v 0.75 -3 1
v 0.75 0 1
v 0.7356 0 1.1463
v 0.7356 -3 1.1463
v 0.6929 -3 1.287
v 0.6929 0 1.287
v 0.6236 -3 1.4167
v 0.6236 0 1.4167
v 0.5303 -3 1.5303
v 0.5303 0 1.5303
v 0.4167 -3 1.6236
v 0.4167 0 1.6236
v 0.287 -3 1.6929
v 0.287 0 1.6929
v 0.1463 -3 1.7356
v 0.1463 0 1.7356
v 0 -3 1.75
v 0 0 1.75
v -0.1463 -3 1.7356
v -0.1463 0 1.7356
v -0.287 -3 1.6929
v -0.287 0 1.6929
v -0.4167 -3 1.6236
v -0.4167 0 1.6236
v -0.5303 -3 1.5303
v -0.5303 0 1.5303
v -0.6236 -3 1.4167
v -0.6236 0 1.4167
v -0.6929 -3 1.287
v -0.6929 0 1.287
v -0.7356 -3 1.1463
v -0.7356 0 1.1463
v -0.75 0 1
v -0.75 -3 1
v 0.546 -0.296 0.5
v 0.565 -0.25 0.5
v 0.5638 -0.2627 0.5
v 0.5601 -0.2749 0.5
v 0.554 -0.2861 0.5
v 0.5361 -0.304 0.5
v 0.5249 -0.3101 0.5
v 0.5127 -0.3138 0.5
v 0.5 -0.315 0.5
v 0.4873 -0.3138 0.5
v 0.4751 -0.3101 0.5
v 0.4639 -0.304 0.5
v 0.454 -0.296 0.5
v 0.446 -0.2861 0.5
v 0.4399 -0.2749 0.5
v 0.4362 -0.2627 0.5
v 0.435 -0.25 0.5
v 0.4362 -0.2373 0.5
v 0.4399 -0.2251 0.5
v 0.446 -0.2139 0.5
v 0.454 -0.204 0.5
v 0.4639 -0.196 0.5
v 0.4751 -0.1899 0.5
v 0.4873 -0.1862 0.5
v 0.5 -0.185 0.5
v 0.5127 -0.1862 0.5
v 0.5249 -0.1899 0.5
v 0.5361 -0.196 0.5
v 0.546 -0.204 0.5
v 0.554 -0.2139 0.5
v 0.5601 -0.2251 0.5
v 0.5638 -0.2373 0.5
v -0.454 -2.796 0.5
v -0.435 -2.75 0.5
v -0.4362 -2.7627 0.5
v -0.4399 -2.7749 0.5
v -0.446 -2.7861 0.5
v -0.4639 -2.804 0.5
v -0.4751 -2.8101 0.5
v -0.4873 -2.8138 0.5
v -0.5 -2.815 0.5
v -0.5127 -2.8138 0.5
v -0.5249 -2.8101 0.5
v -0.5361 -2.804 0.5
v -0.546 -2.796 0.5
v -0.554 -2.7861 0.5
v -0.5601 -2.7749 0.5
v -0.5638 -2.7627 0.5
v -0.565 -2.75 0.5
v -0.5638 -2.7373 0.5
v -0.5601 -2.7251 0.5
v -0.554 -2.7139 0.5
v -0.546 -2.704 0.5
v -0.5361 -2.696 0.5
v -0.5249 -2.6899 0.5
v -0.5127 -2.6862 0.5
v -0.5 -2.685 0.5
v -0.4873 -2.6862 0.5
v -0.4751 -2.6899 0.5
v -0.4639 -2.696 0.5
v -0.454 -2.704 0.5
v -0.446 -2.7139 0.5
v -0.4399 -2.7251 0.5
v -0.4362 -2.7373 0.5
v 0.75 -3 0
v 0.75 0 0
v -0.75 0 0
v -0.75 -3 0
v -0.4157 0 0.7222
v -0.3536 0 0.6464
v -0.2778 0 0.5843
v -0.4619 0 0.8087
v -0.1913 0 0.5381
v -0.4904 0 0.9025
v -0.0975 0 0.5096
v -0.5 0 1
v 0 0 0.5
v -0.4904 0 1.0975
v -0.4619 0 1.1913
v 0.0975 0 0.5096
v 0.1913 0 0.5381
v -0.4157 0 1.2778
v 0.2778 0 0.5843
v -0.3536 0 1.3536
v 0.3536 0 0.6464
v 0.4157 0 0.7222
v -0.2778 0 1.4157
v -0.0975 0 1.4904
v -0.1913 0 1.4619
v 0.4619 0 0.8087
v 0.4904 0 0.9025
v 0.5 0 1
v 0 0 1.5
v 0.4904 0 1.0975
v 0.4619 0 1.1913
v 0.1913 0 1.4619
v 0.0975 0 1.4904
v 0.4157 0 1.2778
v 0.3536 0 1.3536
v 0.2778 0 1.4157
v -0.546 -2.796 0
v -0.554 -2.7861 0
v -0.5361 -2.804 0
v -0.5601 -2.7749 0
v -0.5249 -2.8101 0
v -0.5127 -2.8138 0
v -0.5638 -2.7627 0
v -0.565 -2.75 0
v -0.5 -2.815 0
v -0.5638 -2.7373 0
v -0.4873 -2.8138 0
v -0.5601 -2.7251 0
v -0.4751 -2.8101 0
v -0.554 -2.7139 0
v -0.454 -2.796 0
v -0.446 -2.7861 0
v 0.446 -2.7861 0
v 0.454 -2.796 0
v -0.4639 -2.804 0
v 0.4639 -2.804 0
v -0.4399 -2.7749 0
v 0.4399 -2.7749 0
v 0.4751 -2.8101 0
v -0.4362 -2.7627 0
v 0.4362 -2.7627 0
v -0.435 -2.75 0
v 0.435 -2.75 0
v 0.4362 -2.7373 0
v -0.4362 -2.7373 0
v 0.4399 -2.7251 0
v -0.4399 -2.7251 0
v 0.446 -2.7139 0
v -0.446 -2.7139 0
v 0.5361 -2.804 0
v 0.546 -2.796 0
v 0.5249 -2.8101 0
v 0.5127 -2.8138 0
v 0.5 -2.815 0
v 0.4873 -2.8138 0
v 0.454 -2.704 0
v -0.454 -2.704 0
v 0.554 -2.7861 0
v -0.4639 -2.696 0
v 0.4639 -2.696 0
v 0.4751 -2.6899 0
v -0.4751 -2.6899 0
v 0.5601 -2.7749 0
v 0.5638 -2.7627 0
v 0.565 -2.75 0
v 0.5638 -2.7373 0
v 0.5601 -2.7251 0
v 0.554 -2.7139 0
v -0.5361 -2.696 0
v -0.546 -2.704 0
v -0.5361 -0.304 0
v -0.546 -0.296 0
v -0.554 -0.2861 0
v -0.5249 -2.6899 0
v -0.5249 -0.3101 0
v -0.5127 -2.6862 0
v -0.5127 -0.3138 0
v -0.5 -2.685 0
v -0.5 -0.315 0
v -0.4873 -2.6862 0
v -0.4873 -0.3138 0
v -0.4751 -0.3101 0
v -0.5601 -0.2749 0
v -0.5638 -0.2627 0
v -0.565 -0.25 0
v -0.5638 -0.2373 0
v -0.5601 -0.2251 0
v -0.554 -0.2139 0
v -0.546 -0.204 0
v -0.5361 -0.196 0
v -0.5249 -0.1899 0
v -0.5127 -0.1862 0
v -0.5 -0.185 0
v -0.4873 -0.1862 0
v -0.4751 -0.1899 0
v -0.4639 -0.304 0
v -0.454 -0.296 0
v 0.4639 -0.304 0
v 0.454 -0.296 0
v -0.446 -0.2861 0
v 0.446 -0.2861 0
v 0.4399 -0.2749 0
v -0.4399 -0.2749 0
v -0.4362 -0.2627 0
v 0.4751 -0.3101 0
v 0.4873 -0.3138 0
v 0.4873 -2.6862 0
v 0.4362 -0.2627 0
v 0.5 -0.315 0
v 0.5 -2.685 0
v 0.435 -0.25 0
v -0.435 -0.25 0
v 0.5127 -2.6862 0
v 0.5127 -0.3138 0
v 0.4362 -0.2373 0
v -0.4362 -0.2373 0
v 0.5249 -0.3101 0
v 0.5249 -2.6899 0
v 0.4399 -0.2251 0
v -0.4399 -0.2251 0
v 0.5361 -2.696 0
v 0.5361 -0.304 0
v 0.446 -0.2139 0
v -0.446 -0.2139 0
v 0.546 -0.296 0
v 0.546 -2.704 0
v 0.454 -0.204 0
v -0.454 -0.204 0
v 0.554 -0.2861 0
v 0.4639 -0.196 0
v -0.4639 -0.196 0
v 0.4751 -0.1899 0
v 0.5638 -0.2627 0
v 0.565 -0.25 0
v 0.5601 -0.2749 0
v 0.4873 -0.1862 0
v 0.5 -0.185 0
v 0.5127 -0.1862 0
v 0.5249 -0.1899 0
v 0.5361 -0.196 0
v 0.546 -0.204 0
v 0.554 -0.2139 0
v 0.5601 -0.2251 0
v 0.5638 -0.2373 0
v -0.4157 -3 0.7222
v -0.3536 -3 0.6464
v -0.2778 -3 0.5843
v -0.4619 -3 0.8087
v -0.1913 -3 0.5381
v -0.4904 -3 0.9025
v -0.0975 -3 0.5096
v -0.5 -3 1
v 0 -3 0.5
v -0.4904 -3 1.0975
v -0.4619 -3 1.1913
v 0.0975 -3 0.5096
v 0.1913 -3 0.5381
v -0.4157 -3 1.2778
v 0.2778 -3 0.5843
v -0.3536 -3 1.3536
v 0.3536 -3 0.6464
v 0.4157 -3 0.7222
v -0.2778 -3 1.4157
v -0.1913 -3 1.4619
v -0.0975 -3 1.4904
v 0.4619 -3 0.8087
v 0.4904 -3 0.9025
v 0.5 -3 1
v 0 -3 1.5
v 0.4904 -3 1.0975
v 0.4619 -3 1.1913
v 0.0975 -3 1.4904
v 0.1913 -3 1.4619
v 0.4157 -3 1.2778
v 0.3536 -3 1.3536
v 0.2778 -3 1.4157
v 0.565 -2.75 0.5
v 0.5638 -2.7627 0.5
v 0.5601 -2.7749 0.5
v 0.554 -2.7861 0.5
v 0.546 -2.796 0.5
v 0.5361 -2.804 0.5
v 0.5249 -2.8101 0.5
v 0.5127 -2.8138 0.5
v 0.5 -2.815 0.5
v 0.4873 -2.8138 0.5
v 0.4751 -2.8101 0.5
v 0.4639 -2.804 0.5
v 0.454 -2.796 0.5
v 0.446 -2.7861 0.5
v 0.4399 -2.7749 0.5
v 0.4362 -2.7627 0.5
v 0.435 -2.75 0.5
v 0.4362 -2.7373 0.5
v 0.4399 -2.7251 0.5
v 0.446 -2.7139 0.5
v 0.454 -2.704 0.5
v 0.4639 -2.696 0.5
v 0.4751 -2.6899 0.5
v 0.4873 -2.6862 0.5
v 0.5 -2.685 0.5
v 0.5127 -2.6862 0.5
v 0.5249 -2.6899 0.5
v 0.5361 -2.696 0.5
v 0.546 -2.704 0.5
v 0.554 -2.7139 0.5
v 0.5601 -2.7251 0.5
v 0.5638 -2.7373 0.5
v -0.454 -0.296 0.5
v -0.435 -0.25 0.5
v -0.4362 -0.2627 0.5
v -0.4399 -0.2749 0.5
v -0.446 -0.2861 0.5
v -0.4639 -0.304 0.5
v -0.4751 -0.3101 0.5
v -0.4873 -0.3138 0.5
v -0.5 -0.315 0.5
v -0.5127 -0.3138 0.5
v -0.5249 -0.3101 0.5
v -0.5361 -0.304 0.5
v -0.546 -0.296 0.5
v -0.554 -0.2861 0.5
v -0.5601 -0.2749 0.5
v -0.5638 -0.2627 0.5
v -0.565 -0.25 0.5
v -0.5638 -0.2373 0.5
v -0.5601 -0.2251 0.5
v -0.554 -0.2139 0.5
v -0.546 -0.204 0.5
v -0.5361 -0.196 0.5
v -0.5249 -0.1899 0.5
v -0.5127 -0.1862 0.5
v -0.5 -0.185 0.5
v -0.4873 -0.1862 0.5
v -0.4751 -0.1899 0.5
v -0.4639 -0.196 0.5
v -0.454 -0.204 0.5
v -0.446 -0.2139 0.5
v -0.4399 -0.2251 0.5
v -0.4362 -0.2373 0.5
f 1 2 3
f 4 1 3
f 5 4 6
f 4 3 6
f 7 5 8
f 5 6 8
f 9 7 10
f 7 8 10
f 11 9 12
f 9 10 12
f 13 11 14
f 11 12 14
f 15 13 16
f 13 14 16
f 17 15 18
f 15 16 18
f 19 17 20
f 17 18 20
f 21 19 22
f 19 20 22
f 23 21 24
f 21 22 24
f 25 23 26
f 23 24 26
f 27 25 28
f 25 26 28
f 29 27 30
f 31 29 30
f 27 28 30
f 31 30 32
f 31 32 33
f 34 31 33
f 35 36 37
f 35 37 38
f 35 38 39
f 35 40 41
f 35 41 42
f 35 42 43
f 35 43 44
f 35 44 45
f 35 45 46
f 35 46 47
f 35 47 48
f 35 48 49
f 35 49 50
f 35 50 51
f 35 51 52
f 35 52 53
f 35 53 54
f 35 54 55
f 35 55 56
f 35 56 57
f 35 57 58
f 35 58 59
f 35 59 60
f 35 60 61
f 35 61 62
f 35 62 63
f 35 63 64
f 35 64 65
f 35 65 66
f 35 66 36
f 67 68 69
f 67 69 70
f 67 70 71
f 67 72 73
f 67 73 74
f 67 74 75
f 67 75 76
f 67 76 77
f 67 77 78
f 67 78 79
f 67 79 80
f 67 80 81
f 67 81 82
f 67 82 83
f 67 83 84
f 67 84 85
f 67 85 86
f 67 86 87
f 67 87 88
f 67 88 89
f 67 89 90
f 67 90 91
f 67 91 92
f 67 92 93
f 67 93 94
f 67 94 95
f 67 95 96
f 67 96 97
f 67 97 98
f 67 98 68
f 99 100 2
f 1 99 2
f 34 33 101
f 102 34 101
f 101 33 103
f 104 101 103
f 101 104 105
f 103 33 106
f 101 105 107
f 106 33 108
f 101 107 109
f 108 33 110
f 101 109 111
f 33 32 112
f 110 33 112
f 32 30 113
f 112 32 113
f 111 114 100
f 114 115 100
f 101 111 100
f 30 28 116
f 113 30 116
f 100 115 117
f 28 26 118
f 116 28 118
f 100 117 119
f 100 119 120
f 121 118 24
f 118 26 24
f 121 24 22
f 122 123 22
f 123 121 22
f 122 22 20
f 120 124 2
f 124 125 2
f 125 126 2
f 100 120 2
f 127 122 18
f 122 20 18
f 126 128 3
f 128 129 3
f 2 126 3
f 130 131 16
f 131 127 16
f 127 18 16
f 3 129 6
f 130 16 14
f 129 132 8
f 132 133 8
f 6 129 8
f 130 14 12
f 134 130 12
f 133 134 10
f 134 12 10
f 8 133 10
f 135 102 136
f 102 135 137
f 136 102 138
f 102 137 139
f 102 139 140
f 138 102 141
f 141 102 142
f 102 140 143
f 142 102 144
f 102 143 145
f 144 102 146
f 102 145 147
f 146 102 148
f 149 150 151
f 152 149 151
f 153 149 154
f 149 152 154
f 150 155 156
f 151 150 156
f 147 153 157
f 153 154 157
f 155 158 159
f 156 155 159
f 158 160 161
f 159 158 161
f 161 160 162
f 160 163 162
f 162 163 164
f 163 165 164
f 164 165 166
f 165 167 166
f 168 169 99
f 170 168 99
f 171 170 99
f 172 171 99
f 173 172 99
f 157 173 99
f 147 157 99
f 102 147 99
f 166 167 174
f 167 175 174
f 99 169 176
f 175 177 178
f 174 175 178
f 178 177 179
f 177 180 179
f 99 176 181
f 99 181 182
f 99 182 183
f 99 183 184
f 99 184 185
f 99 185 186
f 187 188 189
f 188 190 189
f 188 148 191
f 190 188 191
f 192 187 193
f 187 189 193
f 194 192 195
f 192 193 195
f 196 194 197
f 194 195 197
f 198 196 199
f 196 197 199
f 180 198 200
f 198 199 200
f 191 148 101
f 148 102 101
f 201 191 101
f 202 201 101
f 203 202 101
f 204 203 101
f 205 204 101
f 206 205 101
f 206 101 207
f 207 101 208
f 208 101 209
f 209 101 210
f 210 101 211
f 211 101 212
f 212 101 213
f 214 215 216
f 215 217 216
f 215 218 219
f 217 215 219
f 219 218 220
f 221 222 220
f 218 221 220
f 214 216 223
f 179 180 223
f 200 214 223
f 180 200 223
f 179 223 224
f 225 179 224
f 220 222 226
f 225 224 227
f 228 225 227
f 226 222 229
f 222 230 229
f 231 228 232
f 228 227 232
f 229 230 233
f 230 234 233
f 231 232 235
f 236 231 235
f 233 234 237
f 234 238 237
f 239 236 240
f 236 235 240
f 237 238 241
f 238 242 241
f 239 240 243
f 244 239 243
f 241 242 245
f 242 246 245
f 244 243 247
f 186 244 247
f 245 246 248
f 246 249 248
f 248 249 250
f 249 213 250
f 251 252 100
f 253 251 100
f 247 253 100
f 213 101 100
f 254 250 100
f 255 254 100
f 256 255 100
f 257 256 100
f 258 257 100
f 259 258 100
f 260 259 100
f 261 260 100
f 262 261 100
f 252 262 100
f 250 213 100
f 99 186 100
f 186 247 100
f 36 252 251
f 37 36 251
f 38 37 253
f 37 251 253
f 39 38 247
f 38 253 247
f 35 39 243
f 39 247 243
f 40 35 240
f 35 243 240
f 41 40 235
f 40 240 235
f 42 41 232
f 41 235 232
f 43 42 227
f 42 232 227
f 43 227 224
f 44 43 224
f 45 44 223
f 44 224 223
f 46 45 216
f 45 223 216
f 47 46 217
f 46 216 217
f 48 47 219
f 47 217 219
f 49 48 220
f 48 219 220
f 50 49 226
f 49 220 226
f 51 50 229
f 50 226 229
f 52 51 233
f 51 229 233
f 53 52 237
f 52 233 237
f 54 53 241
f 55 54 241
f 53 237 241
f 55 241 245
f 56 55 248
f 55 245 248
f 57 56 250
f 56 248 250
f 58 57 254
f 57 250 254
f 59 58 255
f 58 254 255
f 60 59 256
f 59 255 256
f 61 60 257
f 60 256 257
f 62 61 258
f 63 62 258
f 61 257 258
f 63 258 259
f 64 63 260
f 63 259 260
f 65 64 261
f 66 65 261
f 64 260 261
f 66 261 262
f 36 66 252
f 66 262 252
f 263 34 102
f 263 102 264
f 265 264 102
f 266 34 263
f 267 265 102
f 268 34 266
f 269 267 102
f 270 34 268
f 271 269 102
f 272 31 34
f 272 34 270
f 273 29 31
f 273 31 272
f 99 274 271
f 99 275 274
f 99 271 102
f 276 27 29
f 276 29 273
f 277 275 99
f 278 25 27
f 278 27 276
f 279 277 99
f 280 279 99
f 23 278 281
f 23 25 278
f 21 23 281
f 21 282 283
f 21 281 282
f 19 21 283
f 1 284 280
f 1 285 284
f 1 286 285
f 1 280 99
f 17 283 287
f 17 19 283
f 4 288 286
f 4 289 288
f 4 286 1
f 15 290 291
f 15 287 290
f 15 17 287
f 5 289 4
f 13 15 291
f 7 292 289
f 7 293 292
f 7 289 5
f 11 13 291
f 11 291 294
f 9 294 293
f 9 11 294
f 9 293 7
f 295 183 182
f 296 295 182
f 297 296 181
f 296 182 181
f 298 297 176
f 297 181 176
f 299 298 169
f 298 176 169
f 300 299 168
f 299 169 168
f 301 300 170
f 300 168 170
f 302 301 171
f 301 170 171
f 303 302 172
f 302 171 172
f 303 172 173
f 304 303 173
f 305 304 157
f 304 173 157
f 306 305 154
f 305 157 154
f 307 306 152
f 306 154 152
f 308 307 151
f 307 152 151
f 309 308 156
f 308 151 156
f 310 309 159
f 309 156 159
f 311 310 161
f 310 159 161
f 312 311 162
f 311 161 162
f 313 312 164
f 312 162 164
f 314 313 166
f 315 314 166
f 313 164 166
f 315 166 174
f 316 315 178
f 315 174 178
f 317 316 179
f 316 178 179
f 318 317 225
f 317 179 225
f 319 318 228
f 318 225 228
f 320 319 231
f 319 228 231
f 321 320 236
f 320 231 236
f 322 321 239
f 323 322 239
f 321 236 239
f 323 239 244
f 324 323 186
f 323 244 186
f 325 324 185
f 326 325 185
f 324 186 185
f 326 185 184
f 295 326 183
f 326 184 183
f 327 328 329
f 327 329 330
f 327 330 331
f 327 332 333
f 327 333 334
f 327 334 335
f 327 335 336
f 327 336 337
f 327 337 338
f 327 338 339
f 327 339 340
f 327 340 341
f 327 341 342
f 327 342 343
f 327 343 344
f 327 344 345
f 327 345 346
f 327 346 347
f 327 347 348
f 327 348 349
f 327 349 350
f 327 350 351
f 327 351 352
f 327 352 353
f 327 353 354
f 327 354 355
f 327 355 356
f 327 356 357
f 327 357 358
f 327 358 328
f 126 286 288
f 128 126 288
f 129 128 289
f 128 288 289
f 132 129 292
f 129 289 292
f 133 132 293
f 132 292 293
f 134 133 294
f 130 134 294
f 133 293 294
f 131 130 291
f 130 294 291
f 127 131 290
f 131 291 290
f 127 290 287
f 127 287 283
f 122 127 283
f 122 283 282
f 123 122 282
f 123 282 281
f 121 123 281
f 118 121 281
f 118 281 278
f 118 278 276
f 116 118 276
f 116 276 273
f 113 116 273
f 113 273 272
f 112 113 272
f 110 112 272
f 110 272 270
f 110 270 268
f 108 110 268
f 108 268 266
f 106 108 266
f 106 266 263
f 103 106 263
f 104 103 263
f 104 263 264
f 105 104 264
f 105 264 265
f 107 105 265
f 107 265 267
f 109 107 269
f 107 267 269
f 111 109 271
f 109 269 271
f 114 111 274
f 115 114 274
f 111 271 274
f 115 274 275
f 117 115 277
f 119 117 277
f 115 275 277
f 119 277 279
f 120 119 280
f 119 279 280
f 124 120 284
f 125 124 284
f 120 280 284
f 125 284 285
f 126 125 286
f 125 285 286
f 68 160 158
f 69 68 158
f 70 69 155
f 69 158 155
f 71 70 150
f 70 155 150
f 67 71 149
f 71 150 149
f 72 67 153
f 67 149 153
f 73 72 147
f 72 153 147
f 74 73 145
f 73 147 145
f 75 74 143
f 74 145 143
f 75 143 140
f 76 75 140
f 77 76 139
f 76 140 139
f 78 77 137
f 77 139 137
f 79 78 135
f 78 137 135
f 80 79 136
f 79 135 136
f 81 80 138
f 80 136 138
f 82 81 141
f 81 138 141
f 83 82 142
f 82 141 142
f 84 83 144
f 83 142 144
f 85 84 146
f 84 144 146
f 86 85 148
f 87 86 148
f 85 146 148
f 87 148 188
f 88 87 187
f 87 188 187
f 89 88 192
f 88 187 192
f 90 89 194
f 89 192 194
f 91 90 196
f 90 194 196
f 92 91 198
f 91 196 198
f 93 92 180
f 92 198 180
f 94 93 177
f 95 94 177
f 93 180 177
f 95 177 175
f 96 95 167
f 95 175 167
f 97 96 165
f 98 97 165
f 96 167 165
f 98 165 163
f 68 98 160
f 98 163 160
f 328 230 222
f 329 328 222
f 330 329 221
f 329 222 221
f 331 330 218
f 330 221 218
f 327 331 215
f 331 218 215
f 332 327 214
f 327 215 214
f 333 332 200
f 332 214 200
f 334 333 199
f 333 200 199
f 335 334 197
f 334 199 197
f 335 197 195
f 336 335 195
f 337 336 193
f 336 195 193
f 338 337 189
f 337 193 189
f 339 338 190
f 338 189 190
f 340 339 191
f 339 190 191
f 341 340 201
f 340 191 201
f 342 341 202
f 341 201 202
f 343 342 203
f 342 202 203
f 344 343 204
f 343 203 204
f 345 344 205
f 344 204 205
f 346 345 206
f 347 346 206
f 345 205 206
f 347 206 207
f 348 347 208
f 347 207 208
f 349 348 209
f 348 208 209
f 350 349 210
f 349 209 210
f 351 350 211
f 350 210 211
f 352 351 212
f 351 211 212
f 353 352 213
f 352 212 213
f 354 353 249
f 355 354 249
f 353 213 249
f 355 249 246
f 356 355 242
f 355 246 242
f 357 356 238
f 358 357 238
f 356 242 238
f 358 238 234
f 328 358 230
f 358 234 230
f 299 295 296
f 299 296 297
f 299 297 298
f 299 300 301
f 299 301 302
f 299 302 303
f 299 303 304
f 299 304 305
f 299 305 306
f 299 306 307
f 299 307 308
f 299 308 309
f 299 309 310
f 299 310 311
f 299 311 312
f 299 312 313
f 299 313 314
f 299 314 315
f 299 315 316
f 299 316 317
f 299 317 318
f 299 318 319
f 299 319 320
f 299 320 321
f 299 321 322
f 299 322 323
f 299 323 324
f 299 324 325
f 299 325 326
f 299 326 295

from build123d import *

# Parameters (mm, degrees)
F0_R     = 0.25
F1_DEPTH = 3
F2_R     = 0.065
F3_DEPTH = 0.5
F4_R     = 0.5
F5_DEPTH = 3.001


with BuildPart() as f1:
    # F0 (on Front) → F1 (new body)
    with BuildSketch(Plane.XZ):
        with BuildLine():
            Line((-0.75, 0), (0, 0))
            Line((0, 0), (0.75, 0))
            Line((0.75, 0), (0.75, 1))
            ThreePointArc((0.75, 1), (0, 1.75), (-0.75, 1))
            Line((-0.75, 1), (-0.75, 0))
        make_face()
        with Locations((0, 1)):
            Circle(F0_R, mode=Mode.SUBTRACT)
    extrude(amount=F1_DEPTH)

    # F2 (on face) → F3 (cut)
    with BuildSketch(Plane(origin=(0, 0, 0), x_dir=(1, 0, 0), z_dir=(0, 0, -1))):
        with Locations((-0.5, 2.75)):
            Circle(F2_R)
        with Locations((0.5, 2.75)):
            Circle(F2_R)
        with Locations((0.5, 0.25)):
            Circle(F2_R)
        with Locations((-0.5, 0.25)):
            Circle(F2_R)
    extrude(amount=-F3_DEPTH, mode=Mode.SUBTRACT)

    # F4 (on face) → F5 (cut, through all)
    with BuildSketch(Plane.XZ.offset(3)):
        with Locations((0, 1)):
            Circle(F4_R)
    extrude(amount=-F5_DEPTH, mode=Mode.SUBTRACT)


solid = f1.part
